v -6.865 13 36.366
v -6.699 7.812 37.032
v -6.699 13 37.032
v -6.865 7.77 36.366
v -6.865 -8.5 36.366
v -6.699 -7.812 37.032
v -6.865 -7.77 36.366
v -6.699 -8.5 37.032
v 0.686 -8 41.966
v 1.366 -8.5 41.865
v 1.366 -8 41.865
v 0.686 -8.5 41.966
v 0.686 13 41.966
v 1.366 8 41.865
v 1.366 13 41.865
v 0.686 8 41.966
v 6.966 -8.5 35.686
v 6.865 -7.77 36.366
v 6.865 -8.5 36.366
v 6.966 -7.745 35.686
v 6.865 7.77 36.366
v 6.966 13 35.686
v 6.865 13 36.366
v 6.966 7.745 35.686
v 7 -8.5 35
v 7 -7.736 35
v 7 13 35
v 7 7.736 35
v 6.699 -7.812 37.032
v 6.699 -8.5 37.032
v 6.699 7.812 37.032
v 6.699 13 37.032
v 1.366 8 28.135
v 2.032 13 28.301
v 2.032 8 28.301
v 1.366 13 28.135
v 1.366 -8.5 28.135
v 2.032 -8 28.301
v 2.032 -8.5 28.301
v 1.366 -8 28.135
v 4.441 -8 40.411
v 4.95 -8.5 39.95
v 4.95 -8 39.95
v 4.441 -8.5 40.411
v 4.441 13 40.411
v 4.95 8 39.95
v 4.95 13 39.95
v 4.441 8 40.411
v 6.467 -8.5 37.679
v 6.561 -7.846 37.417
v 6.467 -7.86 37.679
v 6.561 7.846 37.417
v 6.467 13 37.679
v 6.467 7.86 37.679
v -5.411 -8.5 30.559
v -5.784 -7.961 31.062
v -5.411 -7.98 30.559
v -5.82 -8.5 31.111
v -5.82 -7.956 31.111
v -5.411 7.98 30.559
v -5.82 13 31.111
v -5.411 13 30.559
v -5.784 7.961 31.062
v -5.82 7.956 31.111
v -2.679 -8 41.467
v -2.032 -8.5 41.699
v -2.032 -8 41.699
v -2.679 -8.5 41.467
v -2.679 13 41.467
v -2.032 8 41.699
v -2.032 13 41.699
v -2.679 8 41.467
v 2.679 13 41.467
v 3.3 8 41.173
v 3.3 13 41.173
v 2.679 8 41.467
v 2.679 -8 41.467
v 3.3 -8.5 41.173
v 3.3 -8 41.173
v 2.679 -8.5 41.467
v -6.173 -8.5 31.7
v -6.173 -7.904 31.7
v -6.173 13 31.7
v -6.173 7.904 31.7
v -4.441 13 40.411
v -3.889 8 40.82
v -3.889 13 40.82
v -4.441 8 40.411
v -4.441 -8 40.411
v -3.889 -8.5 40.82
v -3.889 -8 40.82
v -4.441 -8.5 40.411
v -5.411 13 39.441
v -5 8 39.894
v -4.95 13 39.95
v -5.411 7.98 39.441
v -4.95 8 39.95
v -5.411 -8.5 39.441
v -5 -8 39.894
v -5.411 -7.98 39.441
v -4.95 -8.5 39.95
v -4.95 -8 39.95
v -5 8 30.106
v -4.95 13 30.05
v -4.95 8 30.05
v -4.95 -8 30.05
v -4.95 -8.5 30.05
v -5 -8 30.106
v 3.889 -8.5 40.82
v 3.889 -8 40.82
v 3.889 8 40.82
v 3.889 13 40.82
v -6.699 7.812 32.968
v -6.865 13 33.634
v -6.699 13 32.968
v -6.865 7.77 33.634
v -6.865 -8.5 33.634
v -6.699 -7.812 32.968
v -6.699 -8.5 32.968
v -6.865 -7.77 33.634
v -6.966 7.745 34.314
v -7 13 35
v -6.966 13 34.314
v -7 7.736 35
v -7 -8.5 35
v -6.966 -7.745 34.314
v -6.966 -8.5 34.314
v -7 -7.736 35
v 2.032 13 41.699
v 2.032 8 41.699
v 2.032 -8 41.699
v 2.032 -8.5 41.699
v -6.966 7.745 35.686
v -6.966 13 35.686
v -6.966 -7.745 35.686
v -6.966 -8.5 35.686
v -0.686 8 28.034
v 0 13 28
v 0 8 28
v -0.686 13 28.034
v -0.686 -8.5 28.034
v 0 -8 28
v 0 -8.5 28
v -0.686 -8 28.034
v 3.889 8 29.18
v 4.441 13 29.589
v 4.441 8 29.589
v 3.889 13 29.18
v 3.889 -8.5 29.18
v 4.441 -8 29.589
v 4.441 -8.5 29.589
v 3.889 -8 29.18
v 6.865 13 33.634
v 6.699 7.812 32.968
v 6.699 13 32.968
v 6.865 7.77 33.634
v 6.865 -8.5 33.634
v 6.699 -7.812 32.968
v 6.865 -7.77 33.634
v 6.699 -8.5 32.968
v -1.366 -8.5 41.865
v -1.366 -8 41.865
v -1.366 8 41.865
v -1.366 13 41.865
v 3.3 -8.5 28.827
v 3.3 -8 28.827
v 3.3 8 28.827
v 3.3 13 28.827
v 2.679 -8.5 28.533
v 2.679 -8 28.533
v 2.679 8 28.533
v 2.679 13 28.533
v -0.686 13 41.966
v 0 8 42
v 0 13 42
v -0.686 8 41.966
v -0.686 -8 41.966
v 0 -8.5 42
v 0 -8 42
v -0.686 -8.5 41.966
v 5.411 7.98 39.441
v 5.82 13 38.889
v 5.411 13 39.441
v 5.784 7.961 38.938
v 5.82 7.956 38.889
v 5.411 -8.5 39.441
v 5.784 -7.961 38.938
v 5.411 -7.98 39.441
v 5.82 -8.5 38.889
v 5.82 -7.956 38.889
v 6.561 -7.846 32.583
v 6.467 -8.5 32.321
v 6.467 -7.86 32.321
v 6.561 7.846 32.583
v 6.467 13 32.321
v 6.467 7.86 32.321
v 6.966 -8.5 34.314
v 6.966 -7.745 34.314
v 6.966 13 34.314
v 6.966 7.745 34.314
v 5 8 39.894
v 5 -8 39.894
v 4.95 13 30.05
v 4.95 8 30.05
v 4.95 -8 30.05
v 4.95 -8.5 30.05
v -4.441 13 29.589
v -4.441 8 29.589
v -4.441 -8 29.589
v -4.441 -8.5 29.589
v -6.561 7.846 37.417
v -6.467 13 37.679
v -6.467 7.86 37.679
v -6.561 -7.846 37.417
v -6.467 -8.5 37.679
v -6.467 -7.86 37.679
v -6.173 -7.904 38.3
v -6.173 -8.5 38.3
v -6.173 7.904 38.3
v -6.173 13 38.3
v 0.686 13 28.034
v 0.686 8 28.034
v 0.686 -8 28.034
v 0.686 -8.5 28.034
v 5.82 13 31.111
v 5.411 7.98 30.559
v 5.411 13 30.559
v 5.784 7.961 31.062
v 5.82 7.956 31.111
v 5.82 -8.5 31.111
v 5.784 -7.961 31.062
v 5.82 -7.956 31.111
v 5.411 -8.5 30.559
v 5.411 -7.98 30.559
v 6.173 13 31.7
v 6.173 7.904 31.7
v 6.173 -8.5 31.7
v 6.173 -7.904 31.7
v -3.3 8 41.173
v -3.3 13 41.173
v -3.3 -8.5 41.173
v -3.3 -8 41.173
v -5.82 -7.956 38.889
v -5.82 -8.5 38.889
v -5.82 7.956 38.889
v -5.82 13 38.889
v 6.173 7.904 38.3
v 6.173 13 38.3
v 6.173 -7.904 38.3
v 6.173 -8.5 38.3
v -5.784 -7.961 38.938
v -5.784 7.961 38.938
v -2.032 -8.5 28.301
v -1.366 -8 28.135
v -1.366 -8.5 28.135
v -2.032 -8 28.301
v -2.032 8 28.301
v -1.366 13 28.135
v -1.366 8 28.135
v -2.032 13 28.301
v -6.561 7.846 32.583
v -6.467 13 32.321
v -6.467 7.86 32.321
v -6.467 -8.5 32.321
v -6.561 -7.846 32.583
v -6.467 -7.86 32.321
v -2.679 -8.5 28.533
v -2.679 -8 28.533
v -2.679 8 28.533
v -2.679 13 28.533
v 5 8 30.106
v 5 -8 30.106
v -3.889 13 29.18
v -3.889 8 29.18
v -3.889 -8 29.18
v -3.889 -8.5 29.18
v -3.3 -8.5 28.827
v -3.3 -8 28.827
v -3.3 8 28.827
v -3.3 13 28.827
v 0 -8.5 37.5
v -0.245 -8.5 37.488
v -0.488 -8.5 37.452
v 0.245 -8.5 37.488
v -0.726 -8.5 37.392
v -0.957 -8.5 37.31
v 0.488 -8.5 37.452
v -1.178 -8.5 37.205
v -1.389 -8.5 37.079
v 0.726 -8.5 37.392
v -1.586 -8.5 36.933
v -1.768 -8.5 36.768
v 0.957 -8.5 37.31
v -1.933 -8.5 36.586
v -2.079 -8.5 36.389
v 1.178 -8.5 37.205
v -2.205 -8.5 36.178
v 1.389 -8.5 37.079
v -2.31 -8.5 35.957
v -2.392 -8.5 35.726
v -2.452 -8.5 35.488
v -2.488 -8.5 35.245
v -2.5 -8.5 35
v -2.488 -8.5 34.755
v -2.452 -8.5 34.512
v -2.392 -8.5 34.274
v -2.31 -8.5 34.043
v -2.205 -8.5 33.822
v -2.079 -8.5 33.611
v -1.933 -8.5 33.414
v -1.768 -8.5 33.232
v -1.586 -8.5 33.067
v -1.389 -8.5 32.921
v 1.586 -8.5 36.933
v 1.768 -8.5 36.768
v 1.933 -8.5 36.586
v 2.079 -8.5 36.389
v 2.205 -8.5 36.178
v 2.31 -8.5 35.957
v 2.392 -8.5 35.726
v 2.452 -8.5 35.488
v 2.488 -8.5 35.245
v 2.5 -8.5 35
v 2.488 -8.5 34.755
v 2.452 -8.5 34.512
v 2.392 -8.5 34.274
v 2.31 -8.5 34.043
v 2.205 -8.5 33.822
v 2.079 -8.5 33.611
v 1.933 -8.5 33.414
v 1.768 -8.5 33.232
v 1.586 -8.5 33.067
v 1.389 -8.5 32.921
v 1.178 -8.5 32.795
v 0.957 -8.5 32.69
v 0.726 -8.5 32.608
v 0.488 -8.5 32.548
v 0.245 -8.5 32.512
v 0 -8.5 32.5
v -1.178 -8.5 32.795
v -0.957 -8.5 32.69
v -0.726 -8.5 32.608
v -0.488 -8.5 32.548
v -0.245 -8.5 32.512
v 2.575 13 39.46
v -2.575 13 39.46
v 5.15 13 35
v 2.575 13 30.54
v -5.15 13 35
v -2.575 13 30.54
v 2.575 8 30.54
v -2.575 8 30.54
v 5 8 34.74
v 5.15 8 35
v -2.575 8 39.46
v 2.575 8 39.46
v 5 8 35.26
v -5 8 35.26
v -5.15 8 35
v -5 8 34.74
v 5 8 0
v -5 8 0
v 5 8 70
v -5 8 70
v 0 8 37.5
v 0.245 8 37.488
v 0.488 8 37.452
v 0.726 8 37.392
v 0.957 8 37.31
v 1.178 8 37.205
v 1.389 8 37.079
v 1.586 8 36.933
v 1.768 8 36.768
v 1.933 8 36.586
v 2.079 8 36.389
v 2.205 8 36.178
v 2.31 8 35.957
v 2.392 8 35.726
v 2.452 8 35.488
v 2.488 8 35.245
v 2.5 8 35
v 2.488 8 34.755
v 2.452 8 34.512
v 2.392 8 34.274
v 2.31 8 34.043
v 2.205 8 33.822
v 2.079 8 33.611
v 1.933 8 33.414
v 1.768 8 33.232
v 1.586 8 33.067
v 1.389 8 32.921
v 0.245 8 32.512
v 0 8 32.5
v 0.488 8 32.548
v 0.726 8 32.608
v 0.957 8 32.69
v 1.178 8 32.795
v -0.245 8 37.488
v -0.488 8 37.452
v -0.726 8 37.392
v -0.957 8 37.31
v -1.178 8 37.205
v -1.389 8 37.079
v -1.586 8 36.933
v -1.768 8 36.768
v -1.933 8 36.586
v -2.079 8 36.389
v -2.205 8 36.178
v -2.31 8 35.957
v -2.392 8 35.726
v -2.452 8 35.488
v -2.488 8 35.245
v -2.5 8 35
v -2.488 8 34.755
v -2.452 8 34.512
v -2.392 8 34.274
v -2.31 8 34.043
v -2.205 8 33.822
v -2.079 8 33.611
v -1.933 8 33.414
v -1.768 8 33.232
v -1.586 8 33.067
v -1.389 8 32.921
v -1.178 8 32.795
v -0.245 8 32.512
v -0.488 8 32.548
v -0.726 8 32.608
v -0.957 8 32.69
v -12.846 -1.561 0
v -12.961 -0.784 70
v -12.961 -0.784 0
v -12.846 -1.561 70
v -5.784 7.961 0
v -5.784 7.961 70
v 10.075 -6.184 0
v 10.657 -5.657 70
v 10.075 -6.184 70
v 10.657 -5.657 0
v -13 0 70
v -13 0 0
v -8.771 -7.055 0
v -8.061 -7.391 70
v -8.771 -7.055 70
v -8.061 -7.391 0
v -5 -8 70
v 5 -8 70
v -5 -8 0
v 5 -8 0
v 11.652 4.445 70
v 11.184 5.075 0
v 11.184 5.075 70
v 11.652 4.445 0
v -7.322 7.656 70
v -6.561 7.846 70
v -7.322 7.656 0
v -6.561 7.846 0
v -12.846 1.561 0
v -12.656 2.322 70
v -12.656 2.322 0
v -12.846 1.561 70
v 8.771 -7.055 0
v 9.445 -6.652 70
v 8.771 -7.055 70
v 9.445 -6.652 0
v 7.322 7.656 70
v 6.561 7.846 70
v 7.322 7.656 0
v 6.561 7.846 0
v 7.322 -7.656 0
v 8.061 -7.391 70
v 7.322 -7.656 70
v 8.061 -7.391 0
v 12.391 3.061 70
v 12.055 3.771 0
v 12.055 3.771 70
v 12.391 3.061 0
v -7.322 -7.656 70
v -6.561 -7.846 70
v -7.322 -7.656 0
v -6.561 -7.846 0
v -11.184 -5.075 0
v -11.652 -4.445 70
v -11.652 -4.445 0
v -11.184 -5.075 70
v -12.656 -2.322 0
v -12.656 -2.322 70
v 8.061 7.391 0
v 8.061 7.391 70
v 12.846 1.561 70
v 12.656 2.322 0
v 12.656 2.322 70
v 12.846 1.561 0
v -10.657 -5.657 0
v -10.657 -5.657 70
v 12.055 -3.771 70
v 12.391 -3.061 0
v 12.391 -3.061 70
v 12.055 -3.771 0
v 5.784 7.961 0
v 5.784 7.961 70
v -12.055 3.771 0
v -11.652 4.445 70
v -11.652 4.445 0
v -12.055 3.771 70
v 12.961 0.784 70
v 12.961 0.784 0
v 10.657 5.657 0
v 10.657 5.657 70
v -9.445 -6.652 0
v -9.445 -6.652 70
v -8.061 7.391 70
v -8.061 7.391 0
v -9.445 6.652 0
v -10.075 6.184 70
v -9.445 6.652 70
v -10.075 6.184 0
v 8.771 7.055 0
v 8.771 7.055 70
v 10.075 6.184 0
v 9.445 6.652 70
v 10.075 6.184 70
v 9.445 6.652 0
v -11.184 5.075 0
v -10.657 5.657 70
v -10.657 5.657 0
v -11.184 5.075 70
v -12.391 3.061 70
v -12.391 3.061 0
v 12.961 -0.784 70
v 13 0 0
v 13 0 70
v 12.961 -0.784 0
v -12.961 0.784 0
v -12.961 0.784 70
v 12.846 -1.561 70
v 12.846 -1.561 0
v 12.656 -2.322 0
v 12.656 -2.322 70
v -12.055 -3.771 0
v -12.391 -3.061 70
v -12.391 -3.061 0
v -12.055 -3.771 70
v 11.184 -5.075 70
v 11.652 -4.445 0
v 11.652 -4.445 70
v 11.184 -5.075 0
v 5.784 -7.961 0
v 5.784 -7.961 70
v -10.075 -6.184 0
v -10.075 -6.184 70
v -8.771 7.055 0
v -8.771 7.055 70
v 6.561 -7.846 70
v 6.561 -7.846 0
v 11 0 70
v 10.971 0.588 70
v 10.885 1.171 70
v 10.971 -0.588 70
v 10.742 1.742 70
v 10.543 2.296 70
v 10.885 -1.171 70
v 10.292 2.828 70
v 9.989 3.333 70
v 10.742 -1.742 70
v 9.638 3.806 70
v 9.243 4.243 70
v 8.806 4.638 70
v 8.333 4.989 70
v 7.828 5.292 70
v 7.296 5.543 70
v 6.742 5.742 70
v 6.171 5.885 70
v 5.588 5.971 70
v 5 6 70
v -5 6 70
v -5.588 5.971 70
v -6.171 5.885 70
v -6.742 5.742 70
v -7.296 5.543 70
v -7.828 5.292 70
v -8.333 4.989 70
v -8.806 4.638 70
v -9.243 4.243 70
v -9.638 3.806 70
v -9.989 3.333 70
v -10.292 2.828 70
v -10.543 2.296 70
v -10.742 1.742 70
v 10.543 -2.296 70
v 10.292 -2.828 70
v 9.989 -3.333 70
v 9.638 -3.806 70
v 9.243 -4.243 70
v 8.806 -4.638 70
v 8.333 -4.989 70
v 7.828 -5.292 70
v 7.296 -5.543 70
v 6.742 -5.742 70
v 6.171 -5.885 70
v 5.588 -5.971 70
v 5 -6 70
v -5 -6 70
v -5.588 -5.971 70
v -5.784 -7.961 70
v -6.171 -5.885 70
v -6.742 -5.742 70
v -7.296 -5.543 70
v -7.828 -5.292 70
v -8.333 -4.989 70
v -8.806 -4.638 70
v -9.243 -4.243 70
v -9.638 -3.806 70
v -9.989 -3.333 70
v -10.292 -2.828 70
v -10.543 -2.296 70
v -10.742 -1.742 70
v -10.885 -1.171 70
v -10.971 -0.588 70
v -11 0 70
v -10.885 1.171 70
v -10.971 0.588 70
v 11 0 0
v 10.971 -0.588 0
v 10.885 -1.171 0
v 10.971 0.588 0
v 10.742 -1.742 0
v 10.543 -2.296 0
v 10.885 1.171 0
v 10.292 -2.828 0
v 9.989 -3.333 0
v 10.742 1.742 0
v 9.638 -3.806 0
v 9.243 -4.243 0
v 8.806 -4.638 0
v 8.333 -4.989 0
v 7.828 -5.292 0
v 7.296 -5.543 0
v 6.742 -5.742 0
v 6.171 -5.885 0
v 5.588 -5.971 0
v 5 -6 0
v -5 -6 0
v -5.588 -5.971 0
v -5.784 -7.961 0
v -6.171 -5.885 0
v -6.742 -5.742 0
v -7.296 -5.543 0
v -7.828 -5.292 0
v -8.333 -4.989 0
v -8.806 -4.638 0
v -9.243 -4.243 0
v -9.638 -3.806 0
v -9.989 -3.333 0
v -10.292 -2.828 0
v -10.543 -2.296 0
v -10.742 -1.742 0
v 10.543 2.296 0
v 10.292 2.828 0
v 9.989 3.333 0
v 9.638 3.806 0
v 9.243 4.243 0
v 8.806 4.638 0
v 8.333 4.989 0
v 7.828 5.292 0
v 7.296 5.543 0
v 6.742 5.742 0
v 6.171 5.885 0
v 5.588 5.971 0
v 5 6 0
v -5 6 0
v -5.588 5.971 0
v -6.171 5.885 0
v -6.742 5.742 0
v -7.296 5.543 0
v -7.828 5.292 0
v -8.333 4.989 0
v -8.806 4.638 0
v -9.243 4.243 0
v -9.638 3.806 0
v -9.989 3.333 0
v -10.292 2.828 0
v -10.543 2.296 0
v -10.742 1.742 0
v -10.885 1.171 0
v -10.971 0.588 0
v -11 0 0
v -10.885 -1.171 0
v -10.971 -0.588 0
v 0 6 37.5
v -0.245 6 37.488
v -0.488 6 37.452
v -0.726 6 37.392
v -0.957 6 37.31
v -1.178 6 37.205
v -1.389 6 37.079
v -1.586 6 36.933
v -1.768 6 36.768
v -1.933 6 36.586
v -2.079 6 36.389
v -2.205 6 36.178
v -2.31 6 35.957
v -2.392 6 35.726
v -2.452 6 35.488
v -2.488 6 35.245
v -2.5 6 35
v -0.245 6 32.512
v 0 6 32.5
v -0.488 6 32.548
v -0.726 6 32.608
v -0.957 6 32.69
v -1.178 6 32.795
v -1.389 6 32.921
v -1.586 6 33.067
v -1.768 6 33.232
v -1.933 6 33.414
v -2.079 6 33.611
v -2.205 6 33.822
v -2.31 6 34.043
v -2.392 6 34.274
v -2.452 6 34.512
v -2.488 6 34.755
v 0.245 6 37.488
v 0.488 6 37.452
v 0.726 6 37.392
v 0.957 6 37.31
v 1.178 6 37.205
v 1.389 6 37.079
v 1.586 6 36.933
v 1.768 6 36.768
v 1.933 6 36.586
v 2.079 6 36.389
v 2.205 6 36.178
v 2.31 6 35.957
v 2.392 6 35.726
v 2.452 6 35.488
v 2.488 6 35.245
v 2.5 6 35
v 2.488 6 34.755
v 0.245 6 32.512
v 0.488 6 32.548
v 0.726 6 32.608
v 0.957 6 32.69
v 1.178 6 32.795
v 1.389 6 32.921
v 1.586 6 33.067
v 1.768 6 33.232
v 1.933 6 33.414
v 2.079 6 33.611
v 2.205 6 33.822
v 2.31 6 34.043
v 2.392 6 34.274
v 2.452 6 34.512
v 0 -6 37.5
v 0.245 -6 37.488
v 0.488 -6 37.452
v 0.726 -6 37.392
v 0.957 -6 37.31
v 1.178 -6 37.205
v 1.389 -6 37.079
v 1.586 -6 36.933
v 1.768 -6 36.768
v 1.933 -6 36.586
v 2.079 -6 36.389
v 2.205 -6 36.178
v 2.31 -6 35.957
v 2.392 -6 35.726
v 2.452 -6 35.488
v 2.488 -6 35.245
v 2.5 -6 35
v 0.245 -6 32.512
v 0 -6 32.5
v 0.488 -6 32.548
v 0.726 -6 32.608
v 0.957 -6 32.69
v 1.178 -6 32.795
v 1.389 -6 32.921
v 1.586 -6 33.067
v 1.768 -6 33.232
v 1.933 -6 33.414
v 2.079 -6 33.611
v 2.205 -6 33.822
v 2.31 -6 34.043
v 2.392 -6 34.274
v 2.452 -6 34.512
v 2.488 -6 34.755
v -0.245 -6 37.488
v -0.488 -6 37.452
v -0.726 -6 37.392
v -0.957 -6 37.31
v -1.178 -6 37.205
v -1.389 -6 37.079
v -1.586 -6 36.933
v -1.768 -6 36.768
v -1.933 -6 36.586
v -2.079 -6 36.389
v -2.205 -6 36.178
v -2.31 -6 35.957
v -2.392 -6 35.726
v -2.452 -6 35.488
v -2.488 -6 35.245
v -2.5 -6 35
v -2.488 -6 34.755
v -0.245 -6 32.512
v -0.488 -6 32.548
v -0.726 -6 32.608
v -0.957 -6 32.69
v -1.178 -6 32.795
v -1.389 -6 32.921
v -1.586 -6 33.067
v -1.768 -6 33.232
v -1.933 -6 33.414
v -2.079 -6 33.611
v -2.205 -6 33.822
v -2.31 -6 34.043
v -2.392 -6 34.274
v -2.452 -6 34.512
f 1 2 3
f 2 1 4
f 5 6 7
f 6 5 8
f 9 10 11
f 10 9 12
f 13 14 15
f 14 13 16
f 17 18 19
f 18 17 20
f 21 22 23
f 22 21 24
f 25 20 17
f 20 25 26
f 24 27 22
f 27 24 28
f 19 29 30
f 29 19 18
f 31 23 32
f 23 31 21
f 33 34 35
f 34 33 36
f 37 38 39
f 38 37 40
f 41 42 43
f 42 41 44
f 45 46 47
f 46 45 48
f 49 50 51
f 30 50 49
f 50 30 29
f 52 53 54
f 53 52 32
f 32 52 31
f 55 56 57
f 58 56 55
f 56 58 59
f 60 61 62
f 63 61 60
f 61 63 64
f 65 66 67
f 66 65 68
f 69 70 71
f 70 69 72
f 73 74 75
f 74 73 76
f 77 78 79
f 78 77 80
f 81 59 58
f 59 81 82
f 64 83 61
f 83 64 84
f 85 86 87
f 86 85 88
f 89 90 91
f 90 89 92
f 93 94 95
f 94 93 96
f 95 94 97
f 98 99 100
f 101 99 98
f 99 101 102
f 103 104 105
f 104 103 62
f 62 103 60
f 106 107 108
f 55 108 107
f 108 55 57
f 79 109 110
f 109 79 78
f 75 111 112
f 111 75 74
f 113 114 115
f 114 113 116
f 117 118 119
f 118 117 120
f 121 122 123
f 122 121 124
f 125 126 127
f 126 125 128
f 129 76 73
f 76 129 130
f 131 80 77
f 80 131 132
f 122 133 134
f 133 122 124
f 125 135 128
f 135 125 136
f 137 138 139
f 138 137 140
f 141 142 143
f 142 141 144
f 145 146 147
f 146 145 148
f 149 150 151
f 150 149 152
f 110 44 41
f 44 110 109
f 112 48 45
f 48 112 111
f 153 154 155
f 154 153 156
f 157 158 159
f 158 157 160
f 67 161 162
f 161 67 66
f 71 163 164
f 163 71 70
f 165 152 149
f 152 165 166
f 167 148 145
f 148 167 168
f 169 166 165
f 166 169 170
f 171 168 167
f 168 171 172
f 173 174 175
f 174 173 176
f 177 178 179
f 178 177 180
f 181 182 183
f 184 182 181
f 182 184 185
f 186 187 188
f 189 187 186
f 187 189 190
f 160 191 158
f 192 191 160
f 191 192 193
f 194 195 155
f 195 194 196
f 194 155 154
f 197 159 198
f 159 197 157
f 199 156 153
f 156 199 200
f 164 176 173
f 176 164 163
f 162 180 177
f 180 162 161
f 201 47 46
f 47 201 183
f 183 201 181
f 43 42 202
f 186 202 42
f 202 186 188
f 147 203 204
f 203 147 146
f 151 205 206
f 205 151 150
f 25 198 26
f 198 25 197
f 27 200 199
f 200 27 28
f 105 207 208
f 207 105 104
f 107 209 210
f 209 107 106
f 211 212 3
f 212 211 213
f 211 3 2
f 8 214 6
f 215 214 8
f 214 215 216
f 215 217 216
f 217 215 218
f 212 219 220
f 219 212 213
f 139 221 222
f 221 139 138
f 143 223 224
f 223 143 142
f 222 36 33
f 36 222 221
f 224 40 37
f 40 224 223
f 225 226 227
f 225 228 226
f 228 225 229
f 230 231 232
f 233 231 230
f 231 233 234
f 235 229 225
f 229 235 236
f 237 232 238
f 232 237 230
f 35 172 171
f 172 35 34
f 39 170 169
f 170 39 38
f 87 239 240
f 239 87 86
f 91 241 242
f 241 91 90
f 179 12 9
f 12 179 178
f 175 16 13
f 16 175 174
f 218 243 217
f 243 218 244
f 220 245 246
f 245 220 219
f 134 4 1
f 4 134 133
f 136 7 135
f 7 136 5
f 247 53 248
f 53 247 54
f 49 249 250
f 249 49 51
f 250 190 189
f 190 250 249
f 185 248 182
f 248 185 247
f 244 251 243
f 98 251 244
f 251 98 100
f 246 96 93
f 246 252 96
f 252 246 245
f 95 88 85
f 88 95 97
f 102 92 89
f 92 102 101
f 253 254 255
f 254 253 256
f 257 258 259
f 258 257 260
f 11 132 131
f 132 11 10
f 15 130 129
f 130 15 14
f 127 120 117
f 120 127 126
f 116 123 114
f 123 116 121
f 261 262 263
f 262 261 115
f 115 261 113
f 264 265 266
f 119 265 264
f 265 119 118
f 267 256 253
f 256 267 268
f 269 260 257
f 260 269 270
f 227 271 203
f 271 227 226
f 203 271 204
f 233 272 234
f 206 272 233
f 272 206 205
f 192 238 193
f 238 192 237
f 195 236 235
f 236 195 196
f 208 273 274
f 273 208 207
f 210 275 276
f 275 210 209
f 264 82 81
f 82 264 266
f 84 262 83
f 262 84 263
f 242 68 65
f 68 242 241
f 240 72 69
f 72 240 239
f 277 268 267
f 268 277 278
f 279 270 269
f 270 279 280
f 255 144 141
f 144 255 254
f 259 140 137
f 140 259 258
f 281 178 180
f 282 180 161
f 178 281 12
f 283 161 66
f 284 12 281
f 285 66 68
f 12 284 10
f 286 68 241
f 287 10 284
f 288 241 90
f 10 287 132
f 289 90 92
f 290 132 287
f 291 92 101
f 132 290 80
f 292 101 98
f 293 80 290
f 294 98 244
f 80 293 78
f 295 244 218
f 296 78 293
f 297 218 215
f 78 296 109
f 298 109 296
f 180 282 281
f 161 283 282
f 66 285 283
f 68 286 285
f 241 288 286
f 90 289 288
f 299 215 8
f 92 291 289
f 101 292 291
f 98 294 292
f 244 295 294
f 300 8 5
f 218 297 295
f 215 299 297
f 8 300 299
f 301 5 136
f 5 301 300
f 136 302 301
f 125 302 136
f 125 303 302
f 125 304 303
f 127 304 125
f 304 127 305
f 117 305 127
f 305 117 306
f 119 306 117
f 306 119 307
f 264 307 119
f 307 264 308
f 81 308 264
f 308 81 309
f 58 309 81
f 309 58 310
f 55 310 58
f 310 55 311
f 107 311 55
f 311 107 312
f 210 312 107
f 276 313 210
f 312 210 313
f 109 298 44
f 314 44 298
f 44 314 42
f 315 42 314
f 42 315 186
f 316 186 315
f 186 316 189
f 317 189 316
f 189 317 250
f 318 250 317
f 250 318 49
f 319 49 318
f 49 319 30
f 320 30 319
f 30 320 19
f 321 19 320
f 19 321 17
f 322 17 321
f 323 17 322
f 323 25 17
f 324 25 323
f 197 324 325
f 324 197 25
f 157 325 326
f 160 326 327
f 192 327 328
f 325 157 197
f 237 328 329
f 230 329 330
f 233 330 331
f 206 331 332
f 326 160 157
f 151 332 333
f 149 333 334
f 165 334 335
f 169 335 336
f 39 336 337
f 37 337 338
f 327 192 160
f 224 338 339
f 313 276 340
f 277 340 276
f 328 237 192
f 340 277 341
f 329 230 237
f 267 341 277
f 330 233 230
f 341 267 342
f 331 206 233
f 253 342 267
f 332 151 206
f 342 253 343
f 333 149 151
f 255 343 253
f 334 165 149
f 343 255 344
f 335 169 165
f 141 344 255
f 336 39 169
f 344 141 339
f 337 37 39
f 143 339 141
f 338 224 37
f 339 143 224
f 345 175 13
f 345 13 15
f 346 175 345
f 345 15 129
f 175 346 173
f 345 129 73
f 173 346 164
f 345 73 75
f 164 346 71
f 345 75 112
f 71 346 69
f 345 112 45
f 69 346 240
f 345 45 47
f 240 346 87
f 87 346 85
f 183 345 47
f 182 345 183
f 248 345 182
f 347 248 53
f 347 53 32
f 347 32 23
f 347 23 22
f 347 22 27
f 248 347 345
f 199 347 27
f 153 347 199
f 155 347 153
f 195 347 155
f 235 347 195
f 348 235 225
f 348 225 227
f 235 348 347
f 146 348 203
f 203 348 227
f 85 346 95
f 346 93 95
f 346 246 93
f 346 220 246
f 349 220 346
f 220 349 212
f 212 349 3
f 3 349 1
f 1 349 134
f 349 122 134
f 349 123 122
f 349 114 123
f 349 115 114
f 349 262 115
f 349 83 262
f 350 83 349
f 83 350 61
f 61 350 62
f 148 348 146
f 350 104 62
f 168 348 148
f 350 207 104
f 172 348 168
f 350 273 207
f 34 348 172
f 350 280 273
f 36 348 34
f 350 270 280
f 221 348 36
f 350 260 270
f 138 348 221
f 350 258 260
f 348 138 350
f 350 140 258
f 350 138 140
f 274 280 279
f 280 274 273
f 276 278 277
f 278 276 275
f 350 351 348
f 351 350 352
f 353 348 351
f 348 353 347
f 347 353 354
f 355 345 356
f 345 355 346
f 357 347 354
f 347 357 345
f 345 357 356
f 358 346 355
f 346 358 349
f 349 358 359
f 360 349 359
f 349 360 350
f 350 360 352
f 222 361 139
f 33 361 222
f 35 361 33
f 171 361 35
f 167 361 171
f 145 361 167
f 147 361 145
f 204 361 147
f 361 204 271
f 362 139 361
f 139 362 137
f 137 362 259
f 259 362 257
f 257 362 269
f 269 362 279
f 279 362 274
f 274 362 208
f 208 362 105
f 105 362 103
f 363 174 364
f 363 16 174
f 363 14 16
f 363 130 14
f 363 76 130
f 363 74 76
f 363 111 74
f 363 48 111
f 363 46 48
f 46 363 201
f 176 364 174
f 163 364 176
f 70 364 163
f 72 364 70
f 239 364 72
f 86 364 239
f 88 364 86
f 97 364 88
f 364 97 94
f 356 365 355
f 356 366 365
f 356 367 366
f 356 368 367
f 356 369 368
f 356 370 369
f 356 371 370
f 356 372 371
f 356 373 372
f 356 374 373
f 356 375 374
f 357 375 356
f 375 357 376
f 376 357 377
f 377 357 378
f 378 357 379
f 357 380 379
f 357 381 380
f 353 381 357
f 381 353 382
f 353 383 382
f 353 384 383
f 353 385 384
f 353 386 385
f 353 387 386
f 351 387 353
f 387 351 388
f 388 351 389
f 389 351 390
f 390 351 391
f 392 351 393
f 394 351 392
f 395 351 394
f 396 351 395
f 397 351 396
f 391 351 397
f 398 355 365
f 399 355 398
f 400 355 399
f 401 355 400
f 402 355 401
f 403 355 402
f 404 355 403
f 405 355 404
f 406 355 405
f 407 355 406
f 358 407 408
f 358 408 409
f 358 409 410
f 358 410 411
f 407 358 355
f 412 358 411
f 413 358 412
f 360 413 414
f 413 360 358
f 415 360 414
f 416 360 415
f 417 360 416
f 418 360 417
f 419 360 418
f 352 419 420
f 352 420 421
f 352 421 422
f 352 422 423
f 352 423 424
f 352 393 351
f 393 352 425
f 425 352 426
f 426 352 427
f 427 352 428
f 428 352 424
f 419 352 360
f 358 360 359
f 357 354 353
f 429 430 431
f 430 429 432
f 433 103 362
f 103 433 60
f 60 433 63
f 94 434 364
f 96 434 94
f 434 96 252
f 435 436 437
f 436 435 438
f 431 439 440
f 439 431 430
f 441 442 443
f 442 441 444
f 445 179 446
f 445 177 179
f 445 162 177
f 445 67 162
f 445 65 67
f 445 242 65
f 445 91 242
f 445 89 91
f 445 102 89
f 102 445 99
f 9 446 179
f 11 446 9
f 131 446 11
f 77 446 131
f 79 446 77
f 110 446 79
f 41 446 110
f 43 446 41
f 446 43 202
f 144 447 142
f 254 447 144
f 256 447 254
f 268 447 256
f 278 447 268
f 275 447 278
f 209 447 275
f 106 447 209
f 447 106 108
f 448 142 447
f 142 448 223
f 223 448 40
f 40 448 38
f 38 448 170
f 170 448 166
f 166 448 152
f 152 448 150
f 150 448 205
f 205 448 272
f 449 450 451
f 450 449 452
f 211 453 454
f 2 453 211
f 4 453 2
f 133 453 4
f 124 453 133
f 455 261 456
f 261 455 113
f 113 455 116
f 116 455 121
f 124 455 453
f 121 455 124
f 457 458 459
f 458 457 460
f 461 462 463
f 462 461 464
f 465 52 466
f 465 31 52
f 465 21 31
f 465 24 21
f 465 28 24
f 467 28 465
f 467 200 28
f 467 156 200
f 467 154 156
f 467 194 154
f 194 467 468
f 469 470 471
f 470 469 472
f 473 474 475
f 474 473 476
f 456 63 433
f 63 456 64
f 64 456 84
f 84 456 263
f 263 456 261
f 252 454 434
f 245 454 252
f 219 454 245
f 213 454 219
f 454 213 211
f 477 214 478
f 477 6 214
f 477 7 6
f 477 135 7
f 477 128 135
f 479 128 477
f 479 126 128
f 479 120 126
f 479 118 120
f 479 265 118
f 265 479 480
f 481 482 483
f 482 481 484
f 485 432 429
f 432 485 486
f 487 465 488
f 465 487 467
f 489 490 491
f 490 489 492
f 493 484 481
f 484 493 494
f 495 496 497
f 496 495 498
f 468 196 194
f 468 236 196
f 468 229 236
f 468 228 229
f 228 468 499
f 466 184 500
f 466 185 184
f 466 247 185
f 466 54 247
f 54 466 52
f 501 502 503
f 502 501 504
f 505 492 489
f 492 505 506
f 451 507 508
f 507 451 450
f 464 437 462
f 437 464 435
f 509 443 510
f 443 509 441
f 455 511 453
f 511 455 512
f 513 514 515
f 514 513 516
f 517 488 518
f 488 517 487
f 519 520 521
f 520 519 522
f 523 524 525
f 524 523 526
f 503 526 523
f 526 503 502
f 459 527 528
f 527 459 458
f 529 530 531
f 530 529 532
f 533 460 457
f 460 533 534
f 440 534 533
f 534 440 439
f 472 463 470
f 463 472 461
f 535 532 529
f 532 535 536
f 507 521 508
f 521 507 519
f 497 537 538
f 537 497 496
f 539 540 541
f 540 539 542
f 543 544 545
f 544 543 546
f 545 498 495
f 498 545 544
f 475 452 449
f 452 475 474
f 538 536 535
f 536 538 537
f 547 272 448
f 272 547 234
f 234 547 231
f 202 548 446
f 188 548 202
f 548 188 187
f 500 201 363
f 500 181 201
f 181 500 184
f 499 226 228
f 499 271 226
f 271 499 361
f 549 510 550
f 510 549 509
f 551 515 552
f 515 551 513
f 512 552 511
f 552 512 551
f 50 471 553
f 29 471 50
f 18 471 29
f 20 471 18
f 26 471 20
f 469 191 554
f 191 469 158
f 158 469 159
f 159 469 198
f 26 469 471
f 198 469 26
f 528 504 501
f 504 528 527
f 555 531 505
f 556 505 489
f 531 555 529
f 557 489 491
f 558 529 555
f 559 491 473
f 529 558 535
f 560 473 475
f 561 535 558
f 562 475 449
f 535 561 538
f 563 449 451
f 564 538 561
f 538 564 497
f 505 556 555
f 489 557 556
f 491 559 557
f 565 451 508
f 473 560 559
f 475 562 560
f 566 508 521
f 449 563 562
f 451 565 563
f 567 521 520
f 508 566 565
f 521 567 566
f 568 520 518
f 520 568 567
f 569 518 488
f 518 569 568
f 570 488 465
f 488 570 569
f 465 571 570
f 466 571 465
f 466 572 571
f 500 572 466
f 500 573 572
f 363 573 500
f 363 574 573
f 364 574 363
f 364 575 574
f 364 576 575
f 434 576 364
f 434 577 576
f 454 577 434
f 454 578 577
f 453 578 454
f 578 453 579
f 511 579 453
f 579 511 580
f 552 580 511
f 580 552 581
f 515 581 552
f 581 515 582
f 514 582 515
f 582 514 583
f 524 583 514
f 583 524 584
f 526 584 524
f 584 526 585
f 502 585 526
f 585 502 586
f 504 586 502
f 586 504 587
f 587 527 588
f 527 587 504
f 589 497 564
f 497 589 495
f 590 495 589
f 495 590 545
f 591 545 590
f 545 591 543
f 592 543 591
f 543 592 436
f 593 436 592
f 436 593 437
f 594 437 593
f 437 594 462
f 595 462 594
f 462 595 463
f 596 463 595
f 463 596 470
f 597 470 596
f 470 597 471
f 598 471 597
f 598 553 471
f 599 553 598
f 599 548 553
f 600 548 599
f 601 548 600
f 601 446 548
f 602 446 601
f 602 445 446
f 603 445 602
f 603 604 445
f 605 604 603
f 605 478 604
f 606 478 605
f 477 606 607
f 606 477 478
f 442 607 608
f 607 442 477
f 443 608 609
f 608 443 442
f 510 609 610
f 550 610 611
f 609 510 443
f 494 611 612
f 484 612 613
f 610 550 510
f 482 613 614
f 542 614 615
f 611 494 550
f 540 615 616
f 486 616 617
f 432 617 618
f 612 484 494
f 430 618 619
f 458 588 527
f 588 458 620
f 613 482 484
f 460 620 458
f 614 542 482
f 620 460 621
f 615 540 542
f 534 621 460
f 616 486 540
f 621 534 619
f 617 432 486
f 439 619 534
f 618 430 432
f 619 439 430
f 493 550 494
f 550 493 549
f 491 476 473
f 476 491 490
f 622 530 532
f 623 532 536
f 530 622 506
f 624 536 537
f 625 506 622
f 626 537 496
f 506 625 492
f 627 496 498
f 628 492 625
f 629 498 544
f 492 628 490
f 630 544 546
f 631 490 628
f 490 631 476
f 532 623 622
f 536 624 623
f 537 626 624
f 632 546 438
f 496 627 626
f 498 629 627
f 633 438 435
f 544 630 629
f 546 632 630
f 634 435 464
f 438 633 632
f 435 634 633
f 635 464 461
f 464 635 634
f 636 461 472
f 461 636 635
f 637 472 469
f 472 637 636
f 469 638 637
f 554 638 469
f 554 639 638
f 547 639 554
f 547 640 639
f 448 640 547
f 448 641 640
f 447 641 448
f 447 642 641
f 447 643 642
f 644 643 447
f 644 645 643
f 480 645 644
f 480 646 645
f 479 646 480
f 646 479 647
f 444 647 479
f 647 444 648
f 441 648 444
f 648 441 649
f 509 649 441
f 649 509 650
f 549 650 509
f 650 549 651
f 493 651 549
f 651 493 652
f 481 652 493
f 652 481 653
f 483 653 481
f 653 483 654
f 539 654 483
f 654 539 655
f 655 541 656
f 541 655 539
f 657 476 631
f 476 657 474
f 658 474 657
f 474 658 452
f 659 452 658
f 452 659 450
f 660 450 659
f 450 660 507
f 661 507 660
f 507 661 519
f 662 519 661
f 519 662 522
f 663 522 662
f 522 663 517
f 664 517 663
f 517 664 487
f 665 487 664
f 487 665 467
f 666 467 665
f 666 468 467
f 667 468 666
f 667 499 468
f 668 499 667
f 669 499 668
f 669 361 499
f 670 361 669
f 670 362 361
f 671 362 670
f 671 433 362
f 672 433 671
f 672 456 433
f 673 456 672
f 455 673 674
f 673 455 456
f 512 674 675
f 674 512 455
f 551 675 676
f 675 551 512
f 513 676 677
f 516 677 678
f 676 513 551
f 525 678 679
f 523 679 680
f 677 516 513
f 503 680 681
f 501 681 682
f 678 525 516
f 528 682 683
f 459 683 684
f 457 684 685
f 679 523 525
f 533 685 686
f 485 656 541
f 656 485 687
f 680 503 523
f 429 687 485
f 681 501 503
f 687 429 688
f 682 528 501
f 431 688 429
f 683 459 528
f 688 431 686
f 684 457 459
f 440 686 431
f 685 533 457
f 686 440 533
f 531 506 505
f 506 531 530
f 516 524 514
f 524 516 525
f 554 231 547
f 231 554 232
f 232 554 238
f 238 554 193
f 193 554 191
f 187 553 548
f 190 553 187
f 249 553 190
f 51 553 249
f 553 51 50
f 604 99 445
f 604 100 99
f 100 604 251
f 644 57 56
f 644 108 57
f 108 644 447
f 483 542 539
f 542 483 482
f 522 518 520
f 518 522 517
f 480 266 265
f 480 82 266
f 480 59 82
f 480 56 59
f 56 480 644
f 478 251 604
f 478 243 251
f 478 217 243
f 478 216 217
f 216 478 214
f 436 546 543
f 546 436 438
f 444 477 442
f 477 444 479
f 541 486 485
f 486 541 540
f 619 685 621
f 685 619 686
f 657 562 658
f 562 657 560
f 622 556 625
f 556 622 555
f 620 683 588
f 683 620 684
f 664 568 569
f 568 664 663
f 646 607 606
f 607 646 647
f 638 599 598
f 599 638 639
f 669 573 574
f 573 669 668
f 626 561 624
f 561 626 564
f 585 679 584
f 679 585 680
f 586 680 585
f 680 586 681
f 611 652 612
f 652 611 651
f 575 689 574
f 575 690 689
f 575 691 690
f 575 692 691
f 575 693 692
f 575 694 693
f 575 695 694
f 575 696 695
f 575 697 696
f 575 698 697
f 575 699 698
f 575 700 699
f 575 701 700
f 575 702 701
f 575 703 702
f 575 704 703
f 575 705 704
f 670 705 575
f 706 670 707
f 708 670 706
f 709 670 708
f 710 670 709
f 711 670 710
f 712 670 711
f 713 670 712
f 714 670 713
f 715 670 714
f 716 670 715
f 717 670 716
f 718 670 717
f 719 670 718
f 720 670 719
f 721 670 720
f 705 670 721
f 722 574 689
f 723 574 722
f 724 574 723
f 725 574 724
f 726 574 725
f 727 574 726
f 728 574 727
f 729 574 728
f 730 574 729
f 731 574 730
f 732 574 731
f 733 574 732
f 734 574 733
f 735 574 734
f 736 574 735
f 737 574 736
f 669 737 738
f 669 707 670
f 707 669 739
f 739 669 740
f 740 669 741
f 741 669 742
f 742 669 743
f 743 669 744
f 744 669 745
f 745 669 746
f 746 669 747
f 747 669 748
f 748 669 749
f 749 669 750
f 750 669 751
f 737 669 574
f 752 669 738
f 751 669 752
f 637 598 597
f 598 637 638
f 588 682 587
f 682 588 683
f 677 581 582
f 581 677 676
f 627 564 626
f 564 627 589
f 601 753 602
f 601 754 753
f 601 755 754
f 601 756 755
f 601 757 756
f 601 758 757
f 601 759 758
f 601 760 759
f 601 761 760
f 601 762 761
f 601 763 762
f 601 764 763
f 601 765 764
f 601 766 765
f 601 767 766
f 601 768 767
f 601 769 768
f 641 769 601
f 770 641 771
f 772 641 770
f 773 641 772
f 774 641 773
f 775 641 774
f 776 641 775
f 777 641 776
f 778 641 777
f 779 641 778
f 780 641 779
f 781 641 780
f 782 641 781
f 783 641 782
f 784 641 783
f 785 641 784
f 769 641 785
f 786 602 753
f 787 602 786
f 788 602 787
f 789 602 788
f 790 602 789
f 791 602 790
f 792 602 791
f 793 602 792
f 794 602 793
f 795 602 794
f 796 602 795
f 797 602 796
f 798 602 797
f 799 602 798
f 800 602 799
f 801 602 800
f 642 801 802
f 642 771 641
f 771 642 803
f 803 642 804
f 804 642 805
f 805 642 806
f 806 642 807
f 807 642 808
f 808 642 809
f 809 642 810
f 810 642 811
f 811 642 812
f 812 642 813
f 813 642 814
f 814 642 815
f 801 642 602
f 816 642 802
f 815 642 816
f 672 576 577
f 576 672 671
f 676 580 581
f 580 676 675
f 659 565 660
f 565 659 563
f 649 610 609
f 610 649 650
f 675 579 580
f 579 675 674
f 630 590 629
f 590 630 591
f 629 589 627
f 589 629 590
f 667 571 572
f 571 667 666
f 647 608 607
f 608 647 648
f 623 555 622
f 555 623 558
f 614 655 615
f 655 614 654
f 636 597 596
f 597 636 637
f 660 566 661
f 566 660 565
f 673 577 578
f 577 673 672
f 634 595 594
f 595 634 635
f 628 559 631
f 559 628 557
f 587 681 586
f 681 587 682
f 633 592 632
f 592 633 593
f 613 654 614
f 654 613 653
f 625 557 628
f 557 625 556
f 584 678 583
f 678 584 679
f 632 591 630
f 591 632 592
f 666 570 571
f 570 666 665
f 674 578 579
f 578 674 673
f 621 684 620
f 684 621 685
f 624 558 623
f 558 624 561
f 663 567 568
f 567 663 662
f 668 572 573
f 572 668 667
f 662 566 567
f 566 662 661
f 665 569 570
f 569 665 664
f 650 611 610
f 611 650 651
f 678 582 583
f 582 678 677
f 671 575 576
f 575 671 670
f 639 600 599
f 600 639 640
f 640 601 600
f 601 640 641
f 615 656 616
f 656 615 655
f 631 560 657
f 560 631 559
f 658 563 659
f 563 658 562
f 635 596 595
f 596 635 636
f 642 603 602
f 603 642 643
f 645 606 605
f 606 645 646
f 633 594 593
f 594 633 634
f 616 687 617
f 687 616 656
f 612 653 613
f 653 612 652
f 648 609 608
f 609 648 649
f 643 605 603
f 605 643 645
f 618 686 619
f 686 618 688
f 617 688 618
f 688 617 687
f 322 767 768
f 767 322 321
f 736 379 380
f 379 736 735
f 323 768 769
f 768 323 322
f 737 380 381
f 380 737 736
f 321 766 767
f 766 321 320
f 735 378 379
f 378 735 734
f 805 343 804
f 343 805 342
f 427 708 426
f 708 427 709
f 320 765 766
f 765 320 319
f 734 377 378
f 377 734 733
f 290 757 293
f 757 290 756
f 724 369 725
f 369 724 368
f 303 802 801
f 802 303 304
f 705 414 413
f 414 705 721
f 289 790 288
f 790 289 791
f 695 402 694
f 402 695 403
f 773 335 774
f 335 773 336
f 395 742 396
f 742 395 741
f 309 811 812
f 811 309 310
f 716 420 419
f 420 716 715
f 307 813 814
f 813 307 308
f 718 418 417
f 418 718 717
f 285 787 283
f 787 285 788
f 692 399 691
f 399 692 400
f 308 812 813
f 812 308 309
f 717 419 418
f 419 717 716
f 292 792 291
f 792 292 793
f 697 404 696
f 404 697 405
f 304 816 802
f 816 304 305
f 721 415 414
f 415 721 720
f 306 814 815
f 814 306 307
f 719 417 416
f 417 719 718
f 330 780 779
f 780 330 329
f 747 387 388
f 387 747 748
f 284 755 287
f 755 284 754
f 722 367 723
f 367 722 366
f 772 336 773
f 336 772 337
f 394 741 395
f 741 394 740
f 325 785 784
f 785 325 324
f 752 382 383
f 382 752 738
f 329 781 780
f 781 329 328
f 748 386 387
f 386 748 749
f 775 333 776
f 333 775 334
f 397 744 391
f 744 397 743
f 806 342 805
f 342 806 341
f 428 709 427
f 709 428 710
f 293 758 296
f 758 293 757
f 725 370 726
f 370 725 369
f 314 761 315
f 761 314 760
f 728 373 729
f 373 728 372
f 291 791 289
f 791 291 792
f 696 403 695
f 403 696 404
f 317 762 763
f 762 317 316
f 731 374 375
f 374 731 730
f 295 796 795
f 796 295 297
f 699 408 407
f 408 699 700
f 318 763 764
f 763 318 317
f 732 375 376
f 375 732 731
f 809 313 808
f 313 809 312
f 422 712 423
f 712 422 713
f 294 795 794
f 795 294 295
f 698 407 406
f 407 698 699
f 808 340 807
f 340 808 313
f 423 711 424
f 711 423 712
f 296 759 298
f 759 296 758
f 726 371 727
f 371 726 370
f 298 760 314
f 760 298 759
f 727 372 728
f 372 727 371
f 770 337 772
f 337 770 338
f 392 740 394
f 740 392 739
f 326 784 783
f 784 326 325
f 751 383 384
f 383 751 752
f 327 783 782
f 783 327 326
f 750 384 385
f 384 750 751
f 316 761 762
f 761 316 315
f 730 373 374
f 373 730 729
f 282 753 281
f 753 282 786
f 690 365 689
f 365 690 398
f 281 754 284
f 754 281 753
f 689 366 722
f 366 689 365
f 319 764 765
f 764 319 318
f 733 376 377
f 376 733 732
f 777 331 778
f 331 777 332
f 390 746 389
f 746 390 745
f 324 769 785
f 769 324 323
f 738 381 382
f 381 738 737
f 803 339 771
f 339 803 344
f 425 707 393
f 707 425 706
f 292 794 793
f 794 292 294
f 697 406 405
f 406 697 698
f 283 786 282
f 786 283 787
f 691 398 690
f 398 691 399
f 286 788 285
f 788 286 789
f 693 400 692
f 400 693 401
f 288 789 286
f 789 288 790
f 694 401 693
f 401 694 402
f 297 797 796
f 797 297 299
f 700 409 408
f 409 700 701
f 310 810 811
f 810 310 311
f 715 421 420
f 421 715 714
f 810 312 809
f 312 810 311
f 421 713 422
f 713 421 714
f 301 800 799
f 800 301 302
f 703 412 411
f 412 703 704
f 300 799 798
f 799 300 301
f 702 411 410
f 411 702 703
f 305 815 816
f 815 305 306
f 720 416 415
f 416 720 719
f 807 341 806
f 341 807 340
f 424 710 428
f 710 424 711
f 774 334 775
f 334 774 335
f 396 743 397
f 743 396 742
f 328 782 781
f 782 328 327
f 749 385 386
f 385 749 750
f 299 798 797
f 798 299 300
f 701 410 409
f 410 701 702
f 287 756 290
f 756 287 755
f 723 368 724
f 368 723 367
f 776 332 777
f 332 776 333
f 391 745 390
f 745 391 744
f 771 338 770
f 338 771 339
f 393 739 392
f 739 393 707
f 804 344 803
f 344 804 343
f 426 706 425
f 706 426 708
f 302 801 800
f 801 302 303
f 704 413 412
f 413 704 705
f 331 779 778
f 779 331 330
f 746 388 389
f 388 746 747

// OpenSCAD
$fn = 64;
pole_d = 12;
pole_r = pole_d/2;
pole_w = 22;
wall_t = 2;
standoff_h = 5;
standoff_p = 0.5;
standoff_od = 14;
standoff_or = standoff_od/2;
standoff_w = standoff_h + standoff_p + pole_d + wall_t*2;
standoff_round_r = 5.15;
standoff_nut_r = 8.75/2;
type = "round";
hole_d = 5;
hole_r = hole_d/2;
bracket_l = 70;
bracket_w = pole_w + wall_t;

profile_offset = pole_w/2 - pole_r;
module pole_profile(add = 0){
	hull(){
		translate([profile_offset,0,0]) circle(r = pole_d/2+add);
		translate([-profile_offset,0,0]) circle(r = pole_d/2+add);
	}
}
module pole_shape(add = 0){
	linear_extrude(height = bracket_l, center = false) pole_profile(add);
}
module standoff(type = "round") {
	difference() {
		cylinder(h = standoff_w, r = standoff_or, center = false);
		if (type == "round") {
			cylinder(h=standoff_h, r=standoff_round_r);
		}
		if (type == "hex") {
			cylinder(h=standoff_h, r=standoff_round_r, $fn=6);
		}
	} 
}


module bracket(type = "round"){
	difference() {
		union() {
			translate([0,pole_r + wall_t + standoff_h,bracket_l/2]) rotate([90,0,0]) standoff(type);
			pole_shape(wall_t);
		}
		pole_shape();
		translate([0,0,bracket_l/2]) rotate([90,0,0]) cylinder(r=hole_r, center = true, h = bracket_w);
	}
}


bracket("hex");
